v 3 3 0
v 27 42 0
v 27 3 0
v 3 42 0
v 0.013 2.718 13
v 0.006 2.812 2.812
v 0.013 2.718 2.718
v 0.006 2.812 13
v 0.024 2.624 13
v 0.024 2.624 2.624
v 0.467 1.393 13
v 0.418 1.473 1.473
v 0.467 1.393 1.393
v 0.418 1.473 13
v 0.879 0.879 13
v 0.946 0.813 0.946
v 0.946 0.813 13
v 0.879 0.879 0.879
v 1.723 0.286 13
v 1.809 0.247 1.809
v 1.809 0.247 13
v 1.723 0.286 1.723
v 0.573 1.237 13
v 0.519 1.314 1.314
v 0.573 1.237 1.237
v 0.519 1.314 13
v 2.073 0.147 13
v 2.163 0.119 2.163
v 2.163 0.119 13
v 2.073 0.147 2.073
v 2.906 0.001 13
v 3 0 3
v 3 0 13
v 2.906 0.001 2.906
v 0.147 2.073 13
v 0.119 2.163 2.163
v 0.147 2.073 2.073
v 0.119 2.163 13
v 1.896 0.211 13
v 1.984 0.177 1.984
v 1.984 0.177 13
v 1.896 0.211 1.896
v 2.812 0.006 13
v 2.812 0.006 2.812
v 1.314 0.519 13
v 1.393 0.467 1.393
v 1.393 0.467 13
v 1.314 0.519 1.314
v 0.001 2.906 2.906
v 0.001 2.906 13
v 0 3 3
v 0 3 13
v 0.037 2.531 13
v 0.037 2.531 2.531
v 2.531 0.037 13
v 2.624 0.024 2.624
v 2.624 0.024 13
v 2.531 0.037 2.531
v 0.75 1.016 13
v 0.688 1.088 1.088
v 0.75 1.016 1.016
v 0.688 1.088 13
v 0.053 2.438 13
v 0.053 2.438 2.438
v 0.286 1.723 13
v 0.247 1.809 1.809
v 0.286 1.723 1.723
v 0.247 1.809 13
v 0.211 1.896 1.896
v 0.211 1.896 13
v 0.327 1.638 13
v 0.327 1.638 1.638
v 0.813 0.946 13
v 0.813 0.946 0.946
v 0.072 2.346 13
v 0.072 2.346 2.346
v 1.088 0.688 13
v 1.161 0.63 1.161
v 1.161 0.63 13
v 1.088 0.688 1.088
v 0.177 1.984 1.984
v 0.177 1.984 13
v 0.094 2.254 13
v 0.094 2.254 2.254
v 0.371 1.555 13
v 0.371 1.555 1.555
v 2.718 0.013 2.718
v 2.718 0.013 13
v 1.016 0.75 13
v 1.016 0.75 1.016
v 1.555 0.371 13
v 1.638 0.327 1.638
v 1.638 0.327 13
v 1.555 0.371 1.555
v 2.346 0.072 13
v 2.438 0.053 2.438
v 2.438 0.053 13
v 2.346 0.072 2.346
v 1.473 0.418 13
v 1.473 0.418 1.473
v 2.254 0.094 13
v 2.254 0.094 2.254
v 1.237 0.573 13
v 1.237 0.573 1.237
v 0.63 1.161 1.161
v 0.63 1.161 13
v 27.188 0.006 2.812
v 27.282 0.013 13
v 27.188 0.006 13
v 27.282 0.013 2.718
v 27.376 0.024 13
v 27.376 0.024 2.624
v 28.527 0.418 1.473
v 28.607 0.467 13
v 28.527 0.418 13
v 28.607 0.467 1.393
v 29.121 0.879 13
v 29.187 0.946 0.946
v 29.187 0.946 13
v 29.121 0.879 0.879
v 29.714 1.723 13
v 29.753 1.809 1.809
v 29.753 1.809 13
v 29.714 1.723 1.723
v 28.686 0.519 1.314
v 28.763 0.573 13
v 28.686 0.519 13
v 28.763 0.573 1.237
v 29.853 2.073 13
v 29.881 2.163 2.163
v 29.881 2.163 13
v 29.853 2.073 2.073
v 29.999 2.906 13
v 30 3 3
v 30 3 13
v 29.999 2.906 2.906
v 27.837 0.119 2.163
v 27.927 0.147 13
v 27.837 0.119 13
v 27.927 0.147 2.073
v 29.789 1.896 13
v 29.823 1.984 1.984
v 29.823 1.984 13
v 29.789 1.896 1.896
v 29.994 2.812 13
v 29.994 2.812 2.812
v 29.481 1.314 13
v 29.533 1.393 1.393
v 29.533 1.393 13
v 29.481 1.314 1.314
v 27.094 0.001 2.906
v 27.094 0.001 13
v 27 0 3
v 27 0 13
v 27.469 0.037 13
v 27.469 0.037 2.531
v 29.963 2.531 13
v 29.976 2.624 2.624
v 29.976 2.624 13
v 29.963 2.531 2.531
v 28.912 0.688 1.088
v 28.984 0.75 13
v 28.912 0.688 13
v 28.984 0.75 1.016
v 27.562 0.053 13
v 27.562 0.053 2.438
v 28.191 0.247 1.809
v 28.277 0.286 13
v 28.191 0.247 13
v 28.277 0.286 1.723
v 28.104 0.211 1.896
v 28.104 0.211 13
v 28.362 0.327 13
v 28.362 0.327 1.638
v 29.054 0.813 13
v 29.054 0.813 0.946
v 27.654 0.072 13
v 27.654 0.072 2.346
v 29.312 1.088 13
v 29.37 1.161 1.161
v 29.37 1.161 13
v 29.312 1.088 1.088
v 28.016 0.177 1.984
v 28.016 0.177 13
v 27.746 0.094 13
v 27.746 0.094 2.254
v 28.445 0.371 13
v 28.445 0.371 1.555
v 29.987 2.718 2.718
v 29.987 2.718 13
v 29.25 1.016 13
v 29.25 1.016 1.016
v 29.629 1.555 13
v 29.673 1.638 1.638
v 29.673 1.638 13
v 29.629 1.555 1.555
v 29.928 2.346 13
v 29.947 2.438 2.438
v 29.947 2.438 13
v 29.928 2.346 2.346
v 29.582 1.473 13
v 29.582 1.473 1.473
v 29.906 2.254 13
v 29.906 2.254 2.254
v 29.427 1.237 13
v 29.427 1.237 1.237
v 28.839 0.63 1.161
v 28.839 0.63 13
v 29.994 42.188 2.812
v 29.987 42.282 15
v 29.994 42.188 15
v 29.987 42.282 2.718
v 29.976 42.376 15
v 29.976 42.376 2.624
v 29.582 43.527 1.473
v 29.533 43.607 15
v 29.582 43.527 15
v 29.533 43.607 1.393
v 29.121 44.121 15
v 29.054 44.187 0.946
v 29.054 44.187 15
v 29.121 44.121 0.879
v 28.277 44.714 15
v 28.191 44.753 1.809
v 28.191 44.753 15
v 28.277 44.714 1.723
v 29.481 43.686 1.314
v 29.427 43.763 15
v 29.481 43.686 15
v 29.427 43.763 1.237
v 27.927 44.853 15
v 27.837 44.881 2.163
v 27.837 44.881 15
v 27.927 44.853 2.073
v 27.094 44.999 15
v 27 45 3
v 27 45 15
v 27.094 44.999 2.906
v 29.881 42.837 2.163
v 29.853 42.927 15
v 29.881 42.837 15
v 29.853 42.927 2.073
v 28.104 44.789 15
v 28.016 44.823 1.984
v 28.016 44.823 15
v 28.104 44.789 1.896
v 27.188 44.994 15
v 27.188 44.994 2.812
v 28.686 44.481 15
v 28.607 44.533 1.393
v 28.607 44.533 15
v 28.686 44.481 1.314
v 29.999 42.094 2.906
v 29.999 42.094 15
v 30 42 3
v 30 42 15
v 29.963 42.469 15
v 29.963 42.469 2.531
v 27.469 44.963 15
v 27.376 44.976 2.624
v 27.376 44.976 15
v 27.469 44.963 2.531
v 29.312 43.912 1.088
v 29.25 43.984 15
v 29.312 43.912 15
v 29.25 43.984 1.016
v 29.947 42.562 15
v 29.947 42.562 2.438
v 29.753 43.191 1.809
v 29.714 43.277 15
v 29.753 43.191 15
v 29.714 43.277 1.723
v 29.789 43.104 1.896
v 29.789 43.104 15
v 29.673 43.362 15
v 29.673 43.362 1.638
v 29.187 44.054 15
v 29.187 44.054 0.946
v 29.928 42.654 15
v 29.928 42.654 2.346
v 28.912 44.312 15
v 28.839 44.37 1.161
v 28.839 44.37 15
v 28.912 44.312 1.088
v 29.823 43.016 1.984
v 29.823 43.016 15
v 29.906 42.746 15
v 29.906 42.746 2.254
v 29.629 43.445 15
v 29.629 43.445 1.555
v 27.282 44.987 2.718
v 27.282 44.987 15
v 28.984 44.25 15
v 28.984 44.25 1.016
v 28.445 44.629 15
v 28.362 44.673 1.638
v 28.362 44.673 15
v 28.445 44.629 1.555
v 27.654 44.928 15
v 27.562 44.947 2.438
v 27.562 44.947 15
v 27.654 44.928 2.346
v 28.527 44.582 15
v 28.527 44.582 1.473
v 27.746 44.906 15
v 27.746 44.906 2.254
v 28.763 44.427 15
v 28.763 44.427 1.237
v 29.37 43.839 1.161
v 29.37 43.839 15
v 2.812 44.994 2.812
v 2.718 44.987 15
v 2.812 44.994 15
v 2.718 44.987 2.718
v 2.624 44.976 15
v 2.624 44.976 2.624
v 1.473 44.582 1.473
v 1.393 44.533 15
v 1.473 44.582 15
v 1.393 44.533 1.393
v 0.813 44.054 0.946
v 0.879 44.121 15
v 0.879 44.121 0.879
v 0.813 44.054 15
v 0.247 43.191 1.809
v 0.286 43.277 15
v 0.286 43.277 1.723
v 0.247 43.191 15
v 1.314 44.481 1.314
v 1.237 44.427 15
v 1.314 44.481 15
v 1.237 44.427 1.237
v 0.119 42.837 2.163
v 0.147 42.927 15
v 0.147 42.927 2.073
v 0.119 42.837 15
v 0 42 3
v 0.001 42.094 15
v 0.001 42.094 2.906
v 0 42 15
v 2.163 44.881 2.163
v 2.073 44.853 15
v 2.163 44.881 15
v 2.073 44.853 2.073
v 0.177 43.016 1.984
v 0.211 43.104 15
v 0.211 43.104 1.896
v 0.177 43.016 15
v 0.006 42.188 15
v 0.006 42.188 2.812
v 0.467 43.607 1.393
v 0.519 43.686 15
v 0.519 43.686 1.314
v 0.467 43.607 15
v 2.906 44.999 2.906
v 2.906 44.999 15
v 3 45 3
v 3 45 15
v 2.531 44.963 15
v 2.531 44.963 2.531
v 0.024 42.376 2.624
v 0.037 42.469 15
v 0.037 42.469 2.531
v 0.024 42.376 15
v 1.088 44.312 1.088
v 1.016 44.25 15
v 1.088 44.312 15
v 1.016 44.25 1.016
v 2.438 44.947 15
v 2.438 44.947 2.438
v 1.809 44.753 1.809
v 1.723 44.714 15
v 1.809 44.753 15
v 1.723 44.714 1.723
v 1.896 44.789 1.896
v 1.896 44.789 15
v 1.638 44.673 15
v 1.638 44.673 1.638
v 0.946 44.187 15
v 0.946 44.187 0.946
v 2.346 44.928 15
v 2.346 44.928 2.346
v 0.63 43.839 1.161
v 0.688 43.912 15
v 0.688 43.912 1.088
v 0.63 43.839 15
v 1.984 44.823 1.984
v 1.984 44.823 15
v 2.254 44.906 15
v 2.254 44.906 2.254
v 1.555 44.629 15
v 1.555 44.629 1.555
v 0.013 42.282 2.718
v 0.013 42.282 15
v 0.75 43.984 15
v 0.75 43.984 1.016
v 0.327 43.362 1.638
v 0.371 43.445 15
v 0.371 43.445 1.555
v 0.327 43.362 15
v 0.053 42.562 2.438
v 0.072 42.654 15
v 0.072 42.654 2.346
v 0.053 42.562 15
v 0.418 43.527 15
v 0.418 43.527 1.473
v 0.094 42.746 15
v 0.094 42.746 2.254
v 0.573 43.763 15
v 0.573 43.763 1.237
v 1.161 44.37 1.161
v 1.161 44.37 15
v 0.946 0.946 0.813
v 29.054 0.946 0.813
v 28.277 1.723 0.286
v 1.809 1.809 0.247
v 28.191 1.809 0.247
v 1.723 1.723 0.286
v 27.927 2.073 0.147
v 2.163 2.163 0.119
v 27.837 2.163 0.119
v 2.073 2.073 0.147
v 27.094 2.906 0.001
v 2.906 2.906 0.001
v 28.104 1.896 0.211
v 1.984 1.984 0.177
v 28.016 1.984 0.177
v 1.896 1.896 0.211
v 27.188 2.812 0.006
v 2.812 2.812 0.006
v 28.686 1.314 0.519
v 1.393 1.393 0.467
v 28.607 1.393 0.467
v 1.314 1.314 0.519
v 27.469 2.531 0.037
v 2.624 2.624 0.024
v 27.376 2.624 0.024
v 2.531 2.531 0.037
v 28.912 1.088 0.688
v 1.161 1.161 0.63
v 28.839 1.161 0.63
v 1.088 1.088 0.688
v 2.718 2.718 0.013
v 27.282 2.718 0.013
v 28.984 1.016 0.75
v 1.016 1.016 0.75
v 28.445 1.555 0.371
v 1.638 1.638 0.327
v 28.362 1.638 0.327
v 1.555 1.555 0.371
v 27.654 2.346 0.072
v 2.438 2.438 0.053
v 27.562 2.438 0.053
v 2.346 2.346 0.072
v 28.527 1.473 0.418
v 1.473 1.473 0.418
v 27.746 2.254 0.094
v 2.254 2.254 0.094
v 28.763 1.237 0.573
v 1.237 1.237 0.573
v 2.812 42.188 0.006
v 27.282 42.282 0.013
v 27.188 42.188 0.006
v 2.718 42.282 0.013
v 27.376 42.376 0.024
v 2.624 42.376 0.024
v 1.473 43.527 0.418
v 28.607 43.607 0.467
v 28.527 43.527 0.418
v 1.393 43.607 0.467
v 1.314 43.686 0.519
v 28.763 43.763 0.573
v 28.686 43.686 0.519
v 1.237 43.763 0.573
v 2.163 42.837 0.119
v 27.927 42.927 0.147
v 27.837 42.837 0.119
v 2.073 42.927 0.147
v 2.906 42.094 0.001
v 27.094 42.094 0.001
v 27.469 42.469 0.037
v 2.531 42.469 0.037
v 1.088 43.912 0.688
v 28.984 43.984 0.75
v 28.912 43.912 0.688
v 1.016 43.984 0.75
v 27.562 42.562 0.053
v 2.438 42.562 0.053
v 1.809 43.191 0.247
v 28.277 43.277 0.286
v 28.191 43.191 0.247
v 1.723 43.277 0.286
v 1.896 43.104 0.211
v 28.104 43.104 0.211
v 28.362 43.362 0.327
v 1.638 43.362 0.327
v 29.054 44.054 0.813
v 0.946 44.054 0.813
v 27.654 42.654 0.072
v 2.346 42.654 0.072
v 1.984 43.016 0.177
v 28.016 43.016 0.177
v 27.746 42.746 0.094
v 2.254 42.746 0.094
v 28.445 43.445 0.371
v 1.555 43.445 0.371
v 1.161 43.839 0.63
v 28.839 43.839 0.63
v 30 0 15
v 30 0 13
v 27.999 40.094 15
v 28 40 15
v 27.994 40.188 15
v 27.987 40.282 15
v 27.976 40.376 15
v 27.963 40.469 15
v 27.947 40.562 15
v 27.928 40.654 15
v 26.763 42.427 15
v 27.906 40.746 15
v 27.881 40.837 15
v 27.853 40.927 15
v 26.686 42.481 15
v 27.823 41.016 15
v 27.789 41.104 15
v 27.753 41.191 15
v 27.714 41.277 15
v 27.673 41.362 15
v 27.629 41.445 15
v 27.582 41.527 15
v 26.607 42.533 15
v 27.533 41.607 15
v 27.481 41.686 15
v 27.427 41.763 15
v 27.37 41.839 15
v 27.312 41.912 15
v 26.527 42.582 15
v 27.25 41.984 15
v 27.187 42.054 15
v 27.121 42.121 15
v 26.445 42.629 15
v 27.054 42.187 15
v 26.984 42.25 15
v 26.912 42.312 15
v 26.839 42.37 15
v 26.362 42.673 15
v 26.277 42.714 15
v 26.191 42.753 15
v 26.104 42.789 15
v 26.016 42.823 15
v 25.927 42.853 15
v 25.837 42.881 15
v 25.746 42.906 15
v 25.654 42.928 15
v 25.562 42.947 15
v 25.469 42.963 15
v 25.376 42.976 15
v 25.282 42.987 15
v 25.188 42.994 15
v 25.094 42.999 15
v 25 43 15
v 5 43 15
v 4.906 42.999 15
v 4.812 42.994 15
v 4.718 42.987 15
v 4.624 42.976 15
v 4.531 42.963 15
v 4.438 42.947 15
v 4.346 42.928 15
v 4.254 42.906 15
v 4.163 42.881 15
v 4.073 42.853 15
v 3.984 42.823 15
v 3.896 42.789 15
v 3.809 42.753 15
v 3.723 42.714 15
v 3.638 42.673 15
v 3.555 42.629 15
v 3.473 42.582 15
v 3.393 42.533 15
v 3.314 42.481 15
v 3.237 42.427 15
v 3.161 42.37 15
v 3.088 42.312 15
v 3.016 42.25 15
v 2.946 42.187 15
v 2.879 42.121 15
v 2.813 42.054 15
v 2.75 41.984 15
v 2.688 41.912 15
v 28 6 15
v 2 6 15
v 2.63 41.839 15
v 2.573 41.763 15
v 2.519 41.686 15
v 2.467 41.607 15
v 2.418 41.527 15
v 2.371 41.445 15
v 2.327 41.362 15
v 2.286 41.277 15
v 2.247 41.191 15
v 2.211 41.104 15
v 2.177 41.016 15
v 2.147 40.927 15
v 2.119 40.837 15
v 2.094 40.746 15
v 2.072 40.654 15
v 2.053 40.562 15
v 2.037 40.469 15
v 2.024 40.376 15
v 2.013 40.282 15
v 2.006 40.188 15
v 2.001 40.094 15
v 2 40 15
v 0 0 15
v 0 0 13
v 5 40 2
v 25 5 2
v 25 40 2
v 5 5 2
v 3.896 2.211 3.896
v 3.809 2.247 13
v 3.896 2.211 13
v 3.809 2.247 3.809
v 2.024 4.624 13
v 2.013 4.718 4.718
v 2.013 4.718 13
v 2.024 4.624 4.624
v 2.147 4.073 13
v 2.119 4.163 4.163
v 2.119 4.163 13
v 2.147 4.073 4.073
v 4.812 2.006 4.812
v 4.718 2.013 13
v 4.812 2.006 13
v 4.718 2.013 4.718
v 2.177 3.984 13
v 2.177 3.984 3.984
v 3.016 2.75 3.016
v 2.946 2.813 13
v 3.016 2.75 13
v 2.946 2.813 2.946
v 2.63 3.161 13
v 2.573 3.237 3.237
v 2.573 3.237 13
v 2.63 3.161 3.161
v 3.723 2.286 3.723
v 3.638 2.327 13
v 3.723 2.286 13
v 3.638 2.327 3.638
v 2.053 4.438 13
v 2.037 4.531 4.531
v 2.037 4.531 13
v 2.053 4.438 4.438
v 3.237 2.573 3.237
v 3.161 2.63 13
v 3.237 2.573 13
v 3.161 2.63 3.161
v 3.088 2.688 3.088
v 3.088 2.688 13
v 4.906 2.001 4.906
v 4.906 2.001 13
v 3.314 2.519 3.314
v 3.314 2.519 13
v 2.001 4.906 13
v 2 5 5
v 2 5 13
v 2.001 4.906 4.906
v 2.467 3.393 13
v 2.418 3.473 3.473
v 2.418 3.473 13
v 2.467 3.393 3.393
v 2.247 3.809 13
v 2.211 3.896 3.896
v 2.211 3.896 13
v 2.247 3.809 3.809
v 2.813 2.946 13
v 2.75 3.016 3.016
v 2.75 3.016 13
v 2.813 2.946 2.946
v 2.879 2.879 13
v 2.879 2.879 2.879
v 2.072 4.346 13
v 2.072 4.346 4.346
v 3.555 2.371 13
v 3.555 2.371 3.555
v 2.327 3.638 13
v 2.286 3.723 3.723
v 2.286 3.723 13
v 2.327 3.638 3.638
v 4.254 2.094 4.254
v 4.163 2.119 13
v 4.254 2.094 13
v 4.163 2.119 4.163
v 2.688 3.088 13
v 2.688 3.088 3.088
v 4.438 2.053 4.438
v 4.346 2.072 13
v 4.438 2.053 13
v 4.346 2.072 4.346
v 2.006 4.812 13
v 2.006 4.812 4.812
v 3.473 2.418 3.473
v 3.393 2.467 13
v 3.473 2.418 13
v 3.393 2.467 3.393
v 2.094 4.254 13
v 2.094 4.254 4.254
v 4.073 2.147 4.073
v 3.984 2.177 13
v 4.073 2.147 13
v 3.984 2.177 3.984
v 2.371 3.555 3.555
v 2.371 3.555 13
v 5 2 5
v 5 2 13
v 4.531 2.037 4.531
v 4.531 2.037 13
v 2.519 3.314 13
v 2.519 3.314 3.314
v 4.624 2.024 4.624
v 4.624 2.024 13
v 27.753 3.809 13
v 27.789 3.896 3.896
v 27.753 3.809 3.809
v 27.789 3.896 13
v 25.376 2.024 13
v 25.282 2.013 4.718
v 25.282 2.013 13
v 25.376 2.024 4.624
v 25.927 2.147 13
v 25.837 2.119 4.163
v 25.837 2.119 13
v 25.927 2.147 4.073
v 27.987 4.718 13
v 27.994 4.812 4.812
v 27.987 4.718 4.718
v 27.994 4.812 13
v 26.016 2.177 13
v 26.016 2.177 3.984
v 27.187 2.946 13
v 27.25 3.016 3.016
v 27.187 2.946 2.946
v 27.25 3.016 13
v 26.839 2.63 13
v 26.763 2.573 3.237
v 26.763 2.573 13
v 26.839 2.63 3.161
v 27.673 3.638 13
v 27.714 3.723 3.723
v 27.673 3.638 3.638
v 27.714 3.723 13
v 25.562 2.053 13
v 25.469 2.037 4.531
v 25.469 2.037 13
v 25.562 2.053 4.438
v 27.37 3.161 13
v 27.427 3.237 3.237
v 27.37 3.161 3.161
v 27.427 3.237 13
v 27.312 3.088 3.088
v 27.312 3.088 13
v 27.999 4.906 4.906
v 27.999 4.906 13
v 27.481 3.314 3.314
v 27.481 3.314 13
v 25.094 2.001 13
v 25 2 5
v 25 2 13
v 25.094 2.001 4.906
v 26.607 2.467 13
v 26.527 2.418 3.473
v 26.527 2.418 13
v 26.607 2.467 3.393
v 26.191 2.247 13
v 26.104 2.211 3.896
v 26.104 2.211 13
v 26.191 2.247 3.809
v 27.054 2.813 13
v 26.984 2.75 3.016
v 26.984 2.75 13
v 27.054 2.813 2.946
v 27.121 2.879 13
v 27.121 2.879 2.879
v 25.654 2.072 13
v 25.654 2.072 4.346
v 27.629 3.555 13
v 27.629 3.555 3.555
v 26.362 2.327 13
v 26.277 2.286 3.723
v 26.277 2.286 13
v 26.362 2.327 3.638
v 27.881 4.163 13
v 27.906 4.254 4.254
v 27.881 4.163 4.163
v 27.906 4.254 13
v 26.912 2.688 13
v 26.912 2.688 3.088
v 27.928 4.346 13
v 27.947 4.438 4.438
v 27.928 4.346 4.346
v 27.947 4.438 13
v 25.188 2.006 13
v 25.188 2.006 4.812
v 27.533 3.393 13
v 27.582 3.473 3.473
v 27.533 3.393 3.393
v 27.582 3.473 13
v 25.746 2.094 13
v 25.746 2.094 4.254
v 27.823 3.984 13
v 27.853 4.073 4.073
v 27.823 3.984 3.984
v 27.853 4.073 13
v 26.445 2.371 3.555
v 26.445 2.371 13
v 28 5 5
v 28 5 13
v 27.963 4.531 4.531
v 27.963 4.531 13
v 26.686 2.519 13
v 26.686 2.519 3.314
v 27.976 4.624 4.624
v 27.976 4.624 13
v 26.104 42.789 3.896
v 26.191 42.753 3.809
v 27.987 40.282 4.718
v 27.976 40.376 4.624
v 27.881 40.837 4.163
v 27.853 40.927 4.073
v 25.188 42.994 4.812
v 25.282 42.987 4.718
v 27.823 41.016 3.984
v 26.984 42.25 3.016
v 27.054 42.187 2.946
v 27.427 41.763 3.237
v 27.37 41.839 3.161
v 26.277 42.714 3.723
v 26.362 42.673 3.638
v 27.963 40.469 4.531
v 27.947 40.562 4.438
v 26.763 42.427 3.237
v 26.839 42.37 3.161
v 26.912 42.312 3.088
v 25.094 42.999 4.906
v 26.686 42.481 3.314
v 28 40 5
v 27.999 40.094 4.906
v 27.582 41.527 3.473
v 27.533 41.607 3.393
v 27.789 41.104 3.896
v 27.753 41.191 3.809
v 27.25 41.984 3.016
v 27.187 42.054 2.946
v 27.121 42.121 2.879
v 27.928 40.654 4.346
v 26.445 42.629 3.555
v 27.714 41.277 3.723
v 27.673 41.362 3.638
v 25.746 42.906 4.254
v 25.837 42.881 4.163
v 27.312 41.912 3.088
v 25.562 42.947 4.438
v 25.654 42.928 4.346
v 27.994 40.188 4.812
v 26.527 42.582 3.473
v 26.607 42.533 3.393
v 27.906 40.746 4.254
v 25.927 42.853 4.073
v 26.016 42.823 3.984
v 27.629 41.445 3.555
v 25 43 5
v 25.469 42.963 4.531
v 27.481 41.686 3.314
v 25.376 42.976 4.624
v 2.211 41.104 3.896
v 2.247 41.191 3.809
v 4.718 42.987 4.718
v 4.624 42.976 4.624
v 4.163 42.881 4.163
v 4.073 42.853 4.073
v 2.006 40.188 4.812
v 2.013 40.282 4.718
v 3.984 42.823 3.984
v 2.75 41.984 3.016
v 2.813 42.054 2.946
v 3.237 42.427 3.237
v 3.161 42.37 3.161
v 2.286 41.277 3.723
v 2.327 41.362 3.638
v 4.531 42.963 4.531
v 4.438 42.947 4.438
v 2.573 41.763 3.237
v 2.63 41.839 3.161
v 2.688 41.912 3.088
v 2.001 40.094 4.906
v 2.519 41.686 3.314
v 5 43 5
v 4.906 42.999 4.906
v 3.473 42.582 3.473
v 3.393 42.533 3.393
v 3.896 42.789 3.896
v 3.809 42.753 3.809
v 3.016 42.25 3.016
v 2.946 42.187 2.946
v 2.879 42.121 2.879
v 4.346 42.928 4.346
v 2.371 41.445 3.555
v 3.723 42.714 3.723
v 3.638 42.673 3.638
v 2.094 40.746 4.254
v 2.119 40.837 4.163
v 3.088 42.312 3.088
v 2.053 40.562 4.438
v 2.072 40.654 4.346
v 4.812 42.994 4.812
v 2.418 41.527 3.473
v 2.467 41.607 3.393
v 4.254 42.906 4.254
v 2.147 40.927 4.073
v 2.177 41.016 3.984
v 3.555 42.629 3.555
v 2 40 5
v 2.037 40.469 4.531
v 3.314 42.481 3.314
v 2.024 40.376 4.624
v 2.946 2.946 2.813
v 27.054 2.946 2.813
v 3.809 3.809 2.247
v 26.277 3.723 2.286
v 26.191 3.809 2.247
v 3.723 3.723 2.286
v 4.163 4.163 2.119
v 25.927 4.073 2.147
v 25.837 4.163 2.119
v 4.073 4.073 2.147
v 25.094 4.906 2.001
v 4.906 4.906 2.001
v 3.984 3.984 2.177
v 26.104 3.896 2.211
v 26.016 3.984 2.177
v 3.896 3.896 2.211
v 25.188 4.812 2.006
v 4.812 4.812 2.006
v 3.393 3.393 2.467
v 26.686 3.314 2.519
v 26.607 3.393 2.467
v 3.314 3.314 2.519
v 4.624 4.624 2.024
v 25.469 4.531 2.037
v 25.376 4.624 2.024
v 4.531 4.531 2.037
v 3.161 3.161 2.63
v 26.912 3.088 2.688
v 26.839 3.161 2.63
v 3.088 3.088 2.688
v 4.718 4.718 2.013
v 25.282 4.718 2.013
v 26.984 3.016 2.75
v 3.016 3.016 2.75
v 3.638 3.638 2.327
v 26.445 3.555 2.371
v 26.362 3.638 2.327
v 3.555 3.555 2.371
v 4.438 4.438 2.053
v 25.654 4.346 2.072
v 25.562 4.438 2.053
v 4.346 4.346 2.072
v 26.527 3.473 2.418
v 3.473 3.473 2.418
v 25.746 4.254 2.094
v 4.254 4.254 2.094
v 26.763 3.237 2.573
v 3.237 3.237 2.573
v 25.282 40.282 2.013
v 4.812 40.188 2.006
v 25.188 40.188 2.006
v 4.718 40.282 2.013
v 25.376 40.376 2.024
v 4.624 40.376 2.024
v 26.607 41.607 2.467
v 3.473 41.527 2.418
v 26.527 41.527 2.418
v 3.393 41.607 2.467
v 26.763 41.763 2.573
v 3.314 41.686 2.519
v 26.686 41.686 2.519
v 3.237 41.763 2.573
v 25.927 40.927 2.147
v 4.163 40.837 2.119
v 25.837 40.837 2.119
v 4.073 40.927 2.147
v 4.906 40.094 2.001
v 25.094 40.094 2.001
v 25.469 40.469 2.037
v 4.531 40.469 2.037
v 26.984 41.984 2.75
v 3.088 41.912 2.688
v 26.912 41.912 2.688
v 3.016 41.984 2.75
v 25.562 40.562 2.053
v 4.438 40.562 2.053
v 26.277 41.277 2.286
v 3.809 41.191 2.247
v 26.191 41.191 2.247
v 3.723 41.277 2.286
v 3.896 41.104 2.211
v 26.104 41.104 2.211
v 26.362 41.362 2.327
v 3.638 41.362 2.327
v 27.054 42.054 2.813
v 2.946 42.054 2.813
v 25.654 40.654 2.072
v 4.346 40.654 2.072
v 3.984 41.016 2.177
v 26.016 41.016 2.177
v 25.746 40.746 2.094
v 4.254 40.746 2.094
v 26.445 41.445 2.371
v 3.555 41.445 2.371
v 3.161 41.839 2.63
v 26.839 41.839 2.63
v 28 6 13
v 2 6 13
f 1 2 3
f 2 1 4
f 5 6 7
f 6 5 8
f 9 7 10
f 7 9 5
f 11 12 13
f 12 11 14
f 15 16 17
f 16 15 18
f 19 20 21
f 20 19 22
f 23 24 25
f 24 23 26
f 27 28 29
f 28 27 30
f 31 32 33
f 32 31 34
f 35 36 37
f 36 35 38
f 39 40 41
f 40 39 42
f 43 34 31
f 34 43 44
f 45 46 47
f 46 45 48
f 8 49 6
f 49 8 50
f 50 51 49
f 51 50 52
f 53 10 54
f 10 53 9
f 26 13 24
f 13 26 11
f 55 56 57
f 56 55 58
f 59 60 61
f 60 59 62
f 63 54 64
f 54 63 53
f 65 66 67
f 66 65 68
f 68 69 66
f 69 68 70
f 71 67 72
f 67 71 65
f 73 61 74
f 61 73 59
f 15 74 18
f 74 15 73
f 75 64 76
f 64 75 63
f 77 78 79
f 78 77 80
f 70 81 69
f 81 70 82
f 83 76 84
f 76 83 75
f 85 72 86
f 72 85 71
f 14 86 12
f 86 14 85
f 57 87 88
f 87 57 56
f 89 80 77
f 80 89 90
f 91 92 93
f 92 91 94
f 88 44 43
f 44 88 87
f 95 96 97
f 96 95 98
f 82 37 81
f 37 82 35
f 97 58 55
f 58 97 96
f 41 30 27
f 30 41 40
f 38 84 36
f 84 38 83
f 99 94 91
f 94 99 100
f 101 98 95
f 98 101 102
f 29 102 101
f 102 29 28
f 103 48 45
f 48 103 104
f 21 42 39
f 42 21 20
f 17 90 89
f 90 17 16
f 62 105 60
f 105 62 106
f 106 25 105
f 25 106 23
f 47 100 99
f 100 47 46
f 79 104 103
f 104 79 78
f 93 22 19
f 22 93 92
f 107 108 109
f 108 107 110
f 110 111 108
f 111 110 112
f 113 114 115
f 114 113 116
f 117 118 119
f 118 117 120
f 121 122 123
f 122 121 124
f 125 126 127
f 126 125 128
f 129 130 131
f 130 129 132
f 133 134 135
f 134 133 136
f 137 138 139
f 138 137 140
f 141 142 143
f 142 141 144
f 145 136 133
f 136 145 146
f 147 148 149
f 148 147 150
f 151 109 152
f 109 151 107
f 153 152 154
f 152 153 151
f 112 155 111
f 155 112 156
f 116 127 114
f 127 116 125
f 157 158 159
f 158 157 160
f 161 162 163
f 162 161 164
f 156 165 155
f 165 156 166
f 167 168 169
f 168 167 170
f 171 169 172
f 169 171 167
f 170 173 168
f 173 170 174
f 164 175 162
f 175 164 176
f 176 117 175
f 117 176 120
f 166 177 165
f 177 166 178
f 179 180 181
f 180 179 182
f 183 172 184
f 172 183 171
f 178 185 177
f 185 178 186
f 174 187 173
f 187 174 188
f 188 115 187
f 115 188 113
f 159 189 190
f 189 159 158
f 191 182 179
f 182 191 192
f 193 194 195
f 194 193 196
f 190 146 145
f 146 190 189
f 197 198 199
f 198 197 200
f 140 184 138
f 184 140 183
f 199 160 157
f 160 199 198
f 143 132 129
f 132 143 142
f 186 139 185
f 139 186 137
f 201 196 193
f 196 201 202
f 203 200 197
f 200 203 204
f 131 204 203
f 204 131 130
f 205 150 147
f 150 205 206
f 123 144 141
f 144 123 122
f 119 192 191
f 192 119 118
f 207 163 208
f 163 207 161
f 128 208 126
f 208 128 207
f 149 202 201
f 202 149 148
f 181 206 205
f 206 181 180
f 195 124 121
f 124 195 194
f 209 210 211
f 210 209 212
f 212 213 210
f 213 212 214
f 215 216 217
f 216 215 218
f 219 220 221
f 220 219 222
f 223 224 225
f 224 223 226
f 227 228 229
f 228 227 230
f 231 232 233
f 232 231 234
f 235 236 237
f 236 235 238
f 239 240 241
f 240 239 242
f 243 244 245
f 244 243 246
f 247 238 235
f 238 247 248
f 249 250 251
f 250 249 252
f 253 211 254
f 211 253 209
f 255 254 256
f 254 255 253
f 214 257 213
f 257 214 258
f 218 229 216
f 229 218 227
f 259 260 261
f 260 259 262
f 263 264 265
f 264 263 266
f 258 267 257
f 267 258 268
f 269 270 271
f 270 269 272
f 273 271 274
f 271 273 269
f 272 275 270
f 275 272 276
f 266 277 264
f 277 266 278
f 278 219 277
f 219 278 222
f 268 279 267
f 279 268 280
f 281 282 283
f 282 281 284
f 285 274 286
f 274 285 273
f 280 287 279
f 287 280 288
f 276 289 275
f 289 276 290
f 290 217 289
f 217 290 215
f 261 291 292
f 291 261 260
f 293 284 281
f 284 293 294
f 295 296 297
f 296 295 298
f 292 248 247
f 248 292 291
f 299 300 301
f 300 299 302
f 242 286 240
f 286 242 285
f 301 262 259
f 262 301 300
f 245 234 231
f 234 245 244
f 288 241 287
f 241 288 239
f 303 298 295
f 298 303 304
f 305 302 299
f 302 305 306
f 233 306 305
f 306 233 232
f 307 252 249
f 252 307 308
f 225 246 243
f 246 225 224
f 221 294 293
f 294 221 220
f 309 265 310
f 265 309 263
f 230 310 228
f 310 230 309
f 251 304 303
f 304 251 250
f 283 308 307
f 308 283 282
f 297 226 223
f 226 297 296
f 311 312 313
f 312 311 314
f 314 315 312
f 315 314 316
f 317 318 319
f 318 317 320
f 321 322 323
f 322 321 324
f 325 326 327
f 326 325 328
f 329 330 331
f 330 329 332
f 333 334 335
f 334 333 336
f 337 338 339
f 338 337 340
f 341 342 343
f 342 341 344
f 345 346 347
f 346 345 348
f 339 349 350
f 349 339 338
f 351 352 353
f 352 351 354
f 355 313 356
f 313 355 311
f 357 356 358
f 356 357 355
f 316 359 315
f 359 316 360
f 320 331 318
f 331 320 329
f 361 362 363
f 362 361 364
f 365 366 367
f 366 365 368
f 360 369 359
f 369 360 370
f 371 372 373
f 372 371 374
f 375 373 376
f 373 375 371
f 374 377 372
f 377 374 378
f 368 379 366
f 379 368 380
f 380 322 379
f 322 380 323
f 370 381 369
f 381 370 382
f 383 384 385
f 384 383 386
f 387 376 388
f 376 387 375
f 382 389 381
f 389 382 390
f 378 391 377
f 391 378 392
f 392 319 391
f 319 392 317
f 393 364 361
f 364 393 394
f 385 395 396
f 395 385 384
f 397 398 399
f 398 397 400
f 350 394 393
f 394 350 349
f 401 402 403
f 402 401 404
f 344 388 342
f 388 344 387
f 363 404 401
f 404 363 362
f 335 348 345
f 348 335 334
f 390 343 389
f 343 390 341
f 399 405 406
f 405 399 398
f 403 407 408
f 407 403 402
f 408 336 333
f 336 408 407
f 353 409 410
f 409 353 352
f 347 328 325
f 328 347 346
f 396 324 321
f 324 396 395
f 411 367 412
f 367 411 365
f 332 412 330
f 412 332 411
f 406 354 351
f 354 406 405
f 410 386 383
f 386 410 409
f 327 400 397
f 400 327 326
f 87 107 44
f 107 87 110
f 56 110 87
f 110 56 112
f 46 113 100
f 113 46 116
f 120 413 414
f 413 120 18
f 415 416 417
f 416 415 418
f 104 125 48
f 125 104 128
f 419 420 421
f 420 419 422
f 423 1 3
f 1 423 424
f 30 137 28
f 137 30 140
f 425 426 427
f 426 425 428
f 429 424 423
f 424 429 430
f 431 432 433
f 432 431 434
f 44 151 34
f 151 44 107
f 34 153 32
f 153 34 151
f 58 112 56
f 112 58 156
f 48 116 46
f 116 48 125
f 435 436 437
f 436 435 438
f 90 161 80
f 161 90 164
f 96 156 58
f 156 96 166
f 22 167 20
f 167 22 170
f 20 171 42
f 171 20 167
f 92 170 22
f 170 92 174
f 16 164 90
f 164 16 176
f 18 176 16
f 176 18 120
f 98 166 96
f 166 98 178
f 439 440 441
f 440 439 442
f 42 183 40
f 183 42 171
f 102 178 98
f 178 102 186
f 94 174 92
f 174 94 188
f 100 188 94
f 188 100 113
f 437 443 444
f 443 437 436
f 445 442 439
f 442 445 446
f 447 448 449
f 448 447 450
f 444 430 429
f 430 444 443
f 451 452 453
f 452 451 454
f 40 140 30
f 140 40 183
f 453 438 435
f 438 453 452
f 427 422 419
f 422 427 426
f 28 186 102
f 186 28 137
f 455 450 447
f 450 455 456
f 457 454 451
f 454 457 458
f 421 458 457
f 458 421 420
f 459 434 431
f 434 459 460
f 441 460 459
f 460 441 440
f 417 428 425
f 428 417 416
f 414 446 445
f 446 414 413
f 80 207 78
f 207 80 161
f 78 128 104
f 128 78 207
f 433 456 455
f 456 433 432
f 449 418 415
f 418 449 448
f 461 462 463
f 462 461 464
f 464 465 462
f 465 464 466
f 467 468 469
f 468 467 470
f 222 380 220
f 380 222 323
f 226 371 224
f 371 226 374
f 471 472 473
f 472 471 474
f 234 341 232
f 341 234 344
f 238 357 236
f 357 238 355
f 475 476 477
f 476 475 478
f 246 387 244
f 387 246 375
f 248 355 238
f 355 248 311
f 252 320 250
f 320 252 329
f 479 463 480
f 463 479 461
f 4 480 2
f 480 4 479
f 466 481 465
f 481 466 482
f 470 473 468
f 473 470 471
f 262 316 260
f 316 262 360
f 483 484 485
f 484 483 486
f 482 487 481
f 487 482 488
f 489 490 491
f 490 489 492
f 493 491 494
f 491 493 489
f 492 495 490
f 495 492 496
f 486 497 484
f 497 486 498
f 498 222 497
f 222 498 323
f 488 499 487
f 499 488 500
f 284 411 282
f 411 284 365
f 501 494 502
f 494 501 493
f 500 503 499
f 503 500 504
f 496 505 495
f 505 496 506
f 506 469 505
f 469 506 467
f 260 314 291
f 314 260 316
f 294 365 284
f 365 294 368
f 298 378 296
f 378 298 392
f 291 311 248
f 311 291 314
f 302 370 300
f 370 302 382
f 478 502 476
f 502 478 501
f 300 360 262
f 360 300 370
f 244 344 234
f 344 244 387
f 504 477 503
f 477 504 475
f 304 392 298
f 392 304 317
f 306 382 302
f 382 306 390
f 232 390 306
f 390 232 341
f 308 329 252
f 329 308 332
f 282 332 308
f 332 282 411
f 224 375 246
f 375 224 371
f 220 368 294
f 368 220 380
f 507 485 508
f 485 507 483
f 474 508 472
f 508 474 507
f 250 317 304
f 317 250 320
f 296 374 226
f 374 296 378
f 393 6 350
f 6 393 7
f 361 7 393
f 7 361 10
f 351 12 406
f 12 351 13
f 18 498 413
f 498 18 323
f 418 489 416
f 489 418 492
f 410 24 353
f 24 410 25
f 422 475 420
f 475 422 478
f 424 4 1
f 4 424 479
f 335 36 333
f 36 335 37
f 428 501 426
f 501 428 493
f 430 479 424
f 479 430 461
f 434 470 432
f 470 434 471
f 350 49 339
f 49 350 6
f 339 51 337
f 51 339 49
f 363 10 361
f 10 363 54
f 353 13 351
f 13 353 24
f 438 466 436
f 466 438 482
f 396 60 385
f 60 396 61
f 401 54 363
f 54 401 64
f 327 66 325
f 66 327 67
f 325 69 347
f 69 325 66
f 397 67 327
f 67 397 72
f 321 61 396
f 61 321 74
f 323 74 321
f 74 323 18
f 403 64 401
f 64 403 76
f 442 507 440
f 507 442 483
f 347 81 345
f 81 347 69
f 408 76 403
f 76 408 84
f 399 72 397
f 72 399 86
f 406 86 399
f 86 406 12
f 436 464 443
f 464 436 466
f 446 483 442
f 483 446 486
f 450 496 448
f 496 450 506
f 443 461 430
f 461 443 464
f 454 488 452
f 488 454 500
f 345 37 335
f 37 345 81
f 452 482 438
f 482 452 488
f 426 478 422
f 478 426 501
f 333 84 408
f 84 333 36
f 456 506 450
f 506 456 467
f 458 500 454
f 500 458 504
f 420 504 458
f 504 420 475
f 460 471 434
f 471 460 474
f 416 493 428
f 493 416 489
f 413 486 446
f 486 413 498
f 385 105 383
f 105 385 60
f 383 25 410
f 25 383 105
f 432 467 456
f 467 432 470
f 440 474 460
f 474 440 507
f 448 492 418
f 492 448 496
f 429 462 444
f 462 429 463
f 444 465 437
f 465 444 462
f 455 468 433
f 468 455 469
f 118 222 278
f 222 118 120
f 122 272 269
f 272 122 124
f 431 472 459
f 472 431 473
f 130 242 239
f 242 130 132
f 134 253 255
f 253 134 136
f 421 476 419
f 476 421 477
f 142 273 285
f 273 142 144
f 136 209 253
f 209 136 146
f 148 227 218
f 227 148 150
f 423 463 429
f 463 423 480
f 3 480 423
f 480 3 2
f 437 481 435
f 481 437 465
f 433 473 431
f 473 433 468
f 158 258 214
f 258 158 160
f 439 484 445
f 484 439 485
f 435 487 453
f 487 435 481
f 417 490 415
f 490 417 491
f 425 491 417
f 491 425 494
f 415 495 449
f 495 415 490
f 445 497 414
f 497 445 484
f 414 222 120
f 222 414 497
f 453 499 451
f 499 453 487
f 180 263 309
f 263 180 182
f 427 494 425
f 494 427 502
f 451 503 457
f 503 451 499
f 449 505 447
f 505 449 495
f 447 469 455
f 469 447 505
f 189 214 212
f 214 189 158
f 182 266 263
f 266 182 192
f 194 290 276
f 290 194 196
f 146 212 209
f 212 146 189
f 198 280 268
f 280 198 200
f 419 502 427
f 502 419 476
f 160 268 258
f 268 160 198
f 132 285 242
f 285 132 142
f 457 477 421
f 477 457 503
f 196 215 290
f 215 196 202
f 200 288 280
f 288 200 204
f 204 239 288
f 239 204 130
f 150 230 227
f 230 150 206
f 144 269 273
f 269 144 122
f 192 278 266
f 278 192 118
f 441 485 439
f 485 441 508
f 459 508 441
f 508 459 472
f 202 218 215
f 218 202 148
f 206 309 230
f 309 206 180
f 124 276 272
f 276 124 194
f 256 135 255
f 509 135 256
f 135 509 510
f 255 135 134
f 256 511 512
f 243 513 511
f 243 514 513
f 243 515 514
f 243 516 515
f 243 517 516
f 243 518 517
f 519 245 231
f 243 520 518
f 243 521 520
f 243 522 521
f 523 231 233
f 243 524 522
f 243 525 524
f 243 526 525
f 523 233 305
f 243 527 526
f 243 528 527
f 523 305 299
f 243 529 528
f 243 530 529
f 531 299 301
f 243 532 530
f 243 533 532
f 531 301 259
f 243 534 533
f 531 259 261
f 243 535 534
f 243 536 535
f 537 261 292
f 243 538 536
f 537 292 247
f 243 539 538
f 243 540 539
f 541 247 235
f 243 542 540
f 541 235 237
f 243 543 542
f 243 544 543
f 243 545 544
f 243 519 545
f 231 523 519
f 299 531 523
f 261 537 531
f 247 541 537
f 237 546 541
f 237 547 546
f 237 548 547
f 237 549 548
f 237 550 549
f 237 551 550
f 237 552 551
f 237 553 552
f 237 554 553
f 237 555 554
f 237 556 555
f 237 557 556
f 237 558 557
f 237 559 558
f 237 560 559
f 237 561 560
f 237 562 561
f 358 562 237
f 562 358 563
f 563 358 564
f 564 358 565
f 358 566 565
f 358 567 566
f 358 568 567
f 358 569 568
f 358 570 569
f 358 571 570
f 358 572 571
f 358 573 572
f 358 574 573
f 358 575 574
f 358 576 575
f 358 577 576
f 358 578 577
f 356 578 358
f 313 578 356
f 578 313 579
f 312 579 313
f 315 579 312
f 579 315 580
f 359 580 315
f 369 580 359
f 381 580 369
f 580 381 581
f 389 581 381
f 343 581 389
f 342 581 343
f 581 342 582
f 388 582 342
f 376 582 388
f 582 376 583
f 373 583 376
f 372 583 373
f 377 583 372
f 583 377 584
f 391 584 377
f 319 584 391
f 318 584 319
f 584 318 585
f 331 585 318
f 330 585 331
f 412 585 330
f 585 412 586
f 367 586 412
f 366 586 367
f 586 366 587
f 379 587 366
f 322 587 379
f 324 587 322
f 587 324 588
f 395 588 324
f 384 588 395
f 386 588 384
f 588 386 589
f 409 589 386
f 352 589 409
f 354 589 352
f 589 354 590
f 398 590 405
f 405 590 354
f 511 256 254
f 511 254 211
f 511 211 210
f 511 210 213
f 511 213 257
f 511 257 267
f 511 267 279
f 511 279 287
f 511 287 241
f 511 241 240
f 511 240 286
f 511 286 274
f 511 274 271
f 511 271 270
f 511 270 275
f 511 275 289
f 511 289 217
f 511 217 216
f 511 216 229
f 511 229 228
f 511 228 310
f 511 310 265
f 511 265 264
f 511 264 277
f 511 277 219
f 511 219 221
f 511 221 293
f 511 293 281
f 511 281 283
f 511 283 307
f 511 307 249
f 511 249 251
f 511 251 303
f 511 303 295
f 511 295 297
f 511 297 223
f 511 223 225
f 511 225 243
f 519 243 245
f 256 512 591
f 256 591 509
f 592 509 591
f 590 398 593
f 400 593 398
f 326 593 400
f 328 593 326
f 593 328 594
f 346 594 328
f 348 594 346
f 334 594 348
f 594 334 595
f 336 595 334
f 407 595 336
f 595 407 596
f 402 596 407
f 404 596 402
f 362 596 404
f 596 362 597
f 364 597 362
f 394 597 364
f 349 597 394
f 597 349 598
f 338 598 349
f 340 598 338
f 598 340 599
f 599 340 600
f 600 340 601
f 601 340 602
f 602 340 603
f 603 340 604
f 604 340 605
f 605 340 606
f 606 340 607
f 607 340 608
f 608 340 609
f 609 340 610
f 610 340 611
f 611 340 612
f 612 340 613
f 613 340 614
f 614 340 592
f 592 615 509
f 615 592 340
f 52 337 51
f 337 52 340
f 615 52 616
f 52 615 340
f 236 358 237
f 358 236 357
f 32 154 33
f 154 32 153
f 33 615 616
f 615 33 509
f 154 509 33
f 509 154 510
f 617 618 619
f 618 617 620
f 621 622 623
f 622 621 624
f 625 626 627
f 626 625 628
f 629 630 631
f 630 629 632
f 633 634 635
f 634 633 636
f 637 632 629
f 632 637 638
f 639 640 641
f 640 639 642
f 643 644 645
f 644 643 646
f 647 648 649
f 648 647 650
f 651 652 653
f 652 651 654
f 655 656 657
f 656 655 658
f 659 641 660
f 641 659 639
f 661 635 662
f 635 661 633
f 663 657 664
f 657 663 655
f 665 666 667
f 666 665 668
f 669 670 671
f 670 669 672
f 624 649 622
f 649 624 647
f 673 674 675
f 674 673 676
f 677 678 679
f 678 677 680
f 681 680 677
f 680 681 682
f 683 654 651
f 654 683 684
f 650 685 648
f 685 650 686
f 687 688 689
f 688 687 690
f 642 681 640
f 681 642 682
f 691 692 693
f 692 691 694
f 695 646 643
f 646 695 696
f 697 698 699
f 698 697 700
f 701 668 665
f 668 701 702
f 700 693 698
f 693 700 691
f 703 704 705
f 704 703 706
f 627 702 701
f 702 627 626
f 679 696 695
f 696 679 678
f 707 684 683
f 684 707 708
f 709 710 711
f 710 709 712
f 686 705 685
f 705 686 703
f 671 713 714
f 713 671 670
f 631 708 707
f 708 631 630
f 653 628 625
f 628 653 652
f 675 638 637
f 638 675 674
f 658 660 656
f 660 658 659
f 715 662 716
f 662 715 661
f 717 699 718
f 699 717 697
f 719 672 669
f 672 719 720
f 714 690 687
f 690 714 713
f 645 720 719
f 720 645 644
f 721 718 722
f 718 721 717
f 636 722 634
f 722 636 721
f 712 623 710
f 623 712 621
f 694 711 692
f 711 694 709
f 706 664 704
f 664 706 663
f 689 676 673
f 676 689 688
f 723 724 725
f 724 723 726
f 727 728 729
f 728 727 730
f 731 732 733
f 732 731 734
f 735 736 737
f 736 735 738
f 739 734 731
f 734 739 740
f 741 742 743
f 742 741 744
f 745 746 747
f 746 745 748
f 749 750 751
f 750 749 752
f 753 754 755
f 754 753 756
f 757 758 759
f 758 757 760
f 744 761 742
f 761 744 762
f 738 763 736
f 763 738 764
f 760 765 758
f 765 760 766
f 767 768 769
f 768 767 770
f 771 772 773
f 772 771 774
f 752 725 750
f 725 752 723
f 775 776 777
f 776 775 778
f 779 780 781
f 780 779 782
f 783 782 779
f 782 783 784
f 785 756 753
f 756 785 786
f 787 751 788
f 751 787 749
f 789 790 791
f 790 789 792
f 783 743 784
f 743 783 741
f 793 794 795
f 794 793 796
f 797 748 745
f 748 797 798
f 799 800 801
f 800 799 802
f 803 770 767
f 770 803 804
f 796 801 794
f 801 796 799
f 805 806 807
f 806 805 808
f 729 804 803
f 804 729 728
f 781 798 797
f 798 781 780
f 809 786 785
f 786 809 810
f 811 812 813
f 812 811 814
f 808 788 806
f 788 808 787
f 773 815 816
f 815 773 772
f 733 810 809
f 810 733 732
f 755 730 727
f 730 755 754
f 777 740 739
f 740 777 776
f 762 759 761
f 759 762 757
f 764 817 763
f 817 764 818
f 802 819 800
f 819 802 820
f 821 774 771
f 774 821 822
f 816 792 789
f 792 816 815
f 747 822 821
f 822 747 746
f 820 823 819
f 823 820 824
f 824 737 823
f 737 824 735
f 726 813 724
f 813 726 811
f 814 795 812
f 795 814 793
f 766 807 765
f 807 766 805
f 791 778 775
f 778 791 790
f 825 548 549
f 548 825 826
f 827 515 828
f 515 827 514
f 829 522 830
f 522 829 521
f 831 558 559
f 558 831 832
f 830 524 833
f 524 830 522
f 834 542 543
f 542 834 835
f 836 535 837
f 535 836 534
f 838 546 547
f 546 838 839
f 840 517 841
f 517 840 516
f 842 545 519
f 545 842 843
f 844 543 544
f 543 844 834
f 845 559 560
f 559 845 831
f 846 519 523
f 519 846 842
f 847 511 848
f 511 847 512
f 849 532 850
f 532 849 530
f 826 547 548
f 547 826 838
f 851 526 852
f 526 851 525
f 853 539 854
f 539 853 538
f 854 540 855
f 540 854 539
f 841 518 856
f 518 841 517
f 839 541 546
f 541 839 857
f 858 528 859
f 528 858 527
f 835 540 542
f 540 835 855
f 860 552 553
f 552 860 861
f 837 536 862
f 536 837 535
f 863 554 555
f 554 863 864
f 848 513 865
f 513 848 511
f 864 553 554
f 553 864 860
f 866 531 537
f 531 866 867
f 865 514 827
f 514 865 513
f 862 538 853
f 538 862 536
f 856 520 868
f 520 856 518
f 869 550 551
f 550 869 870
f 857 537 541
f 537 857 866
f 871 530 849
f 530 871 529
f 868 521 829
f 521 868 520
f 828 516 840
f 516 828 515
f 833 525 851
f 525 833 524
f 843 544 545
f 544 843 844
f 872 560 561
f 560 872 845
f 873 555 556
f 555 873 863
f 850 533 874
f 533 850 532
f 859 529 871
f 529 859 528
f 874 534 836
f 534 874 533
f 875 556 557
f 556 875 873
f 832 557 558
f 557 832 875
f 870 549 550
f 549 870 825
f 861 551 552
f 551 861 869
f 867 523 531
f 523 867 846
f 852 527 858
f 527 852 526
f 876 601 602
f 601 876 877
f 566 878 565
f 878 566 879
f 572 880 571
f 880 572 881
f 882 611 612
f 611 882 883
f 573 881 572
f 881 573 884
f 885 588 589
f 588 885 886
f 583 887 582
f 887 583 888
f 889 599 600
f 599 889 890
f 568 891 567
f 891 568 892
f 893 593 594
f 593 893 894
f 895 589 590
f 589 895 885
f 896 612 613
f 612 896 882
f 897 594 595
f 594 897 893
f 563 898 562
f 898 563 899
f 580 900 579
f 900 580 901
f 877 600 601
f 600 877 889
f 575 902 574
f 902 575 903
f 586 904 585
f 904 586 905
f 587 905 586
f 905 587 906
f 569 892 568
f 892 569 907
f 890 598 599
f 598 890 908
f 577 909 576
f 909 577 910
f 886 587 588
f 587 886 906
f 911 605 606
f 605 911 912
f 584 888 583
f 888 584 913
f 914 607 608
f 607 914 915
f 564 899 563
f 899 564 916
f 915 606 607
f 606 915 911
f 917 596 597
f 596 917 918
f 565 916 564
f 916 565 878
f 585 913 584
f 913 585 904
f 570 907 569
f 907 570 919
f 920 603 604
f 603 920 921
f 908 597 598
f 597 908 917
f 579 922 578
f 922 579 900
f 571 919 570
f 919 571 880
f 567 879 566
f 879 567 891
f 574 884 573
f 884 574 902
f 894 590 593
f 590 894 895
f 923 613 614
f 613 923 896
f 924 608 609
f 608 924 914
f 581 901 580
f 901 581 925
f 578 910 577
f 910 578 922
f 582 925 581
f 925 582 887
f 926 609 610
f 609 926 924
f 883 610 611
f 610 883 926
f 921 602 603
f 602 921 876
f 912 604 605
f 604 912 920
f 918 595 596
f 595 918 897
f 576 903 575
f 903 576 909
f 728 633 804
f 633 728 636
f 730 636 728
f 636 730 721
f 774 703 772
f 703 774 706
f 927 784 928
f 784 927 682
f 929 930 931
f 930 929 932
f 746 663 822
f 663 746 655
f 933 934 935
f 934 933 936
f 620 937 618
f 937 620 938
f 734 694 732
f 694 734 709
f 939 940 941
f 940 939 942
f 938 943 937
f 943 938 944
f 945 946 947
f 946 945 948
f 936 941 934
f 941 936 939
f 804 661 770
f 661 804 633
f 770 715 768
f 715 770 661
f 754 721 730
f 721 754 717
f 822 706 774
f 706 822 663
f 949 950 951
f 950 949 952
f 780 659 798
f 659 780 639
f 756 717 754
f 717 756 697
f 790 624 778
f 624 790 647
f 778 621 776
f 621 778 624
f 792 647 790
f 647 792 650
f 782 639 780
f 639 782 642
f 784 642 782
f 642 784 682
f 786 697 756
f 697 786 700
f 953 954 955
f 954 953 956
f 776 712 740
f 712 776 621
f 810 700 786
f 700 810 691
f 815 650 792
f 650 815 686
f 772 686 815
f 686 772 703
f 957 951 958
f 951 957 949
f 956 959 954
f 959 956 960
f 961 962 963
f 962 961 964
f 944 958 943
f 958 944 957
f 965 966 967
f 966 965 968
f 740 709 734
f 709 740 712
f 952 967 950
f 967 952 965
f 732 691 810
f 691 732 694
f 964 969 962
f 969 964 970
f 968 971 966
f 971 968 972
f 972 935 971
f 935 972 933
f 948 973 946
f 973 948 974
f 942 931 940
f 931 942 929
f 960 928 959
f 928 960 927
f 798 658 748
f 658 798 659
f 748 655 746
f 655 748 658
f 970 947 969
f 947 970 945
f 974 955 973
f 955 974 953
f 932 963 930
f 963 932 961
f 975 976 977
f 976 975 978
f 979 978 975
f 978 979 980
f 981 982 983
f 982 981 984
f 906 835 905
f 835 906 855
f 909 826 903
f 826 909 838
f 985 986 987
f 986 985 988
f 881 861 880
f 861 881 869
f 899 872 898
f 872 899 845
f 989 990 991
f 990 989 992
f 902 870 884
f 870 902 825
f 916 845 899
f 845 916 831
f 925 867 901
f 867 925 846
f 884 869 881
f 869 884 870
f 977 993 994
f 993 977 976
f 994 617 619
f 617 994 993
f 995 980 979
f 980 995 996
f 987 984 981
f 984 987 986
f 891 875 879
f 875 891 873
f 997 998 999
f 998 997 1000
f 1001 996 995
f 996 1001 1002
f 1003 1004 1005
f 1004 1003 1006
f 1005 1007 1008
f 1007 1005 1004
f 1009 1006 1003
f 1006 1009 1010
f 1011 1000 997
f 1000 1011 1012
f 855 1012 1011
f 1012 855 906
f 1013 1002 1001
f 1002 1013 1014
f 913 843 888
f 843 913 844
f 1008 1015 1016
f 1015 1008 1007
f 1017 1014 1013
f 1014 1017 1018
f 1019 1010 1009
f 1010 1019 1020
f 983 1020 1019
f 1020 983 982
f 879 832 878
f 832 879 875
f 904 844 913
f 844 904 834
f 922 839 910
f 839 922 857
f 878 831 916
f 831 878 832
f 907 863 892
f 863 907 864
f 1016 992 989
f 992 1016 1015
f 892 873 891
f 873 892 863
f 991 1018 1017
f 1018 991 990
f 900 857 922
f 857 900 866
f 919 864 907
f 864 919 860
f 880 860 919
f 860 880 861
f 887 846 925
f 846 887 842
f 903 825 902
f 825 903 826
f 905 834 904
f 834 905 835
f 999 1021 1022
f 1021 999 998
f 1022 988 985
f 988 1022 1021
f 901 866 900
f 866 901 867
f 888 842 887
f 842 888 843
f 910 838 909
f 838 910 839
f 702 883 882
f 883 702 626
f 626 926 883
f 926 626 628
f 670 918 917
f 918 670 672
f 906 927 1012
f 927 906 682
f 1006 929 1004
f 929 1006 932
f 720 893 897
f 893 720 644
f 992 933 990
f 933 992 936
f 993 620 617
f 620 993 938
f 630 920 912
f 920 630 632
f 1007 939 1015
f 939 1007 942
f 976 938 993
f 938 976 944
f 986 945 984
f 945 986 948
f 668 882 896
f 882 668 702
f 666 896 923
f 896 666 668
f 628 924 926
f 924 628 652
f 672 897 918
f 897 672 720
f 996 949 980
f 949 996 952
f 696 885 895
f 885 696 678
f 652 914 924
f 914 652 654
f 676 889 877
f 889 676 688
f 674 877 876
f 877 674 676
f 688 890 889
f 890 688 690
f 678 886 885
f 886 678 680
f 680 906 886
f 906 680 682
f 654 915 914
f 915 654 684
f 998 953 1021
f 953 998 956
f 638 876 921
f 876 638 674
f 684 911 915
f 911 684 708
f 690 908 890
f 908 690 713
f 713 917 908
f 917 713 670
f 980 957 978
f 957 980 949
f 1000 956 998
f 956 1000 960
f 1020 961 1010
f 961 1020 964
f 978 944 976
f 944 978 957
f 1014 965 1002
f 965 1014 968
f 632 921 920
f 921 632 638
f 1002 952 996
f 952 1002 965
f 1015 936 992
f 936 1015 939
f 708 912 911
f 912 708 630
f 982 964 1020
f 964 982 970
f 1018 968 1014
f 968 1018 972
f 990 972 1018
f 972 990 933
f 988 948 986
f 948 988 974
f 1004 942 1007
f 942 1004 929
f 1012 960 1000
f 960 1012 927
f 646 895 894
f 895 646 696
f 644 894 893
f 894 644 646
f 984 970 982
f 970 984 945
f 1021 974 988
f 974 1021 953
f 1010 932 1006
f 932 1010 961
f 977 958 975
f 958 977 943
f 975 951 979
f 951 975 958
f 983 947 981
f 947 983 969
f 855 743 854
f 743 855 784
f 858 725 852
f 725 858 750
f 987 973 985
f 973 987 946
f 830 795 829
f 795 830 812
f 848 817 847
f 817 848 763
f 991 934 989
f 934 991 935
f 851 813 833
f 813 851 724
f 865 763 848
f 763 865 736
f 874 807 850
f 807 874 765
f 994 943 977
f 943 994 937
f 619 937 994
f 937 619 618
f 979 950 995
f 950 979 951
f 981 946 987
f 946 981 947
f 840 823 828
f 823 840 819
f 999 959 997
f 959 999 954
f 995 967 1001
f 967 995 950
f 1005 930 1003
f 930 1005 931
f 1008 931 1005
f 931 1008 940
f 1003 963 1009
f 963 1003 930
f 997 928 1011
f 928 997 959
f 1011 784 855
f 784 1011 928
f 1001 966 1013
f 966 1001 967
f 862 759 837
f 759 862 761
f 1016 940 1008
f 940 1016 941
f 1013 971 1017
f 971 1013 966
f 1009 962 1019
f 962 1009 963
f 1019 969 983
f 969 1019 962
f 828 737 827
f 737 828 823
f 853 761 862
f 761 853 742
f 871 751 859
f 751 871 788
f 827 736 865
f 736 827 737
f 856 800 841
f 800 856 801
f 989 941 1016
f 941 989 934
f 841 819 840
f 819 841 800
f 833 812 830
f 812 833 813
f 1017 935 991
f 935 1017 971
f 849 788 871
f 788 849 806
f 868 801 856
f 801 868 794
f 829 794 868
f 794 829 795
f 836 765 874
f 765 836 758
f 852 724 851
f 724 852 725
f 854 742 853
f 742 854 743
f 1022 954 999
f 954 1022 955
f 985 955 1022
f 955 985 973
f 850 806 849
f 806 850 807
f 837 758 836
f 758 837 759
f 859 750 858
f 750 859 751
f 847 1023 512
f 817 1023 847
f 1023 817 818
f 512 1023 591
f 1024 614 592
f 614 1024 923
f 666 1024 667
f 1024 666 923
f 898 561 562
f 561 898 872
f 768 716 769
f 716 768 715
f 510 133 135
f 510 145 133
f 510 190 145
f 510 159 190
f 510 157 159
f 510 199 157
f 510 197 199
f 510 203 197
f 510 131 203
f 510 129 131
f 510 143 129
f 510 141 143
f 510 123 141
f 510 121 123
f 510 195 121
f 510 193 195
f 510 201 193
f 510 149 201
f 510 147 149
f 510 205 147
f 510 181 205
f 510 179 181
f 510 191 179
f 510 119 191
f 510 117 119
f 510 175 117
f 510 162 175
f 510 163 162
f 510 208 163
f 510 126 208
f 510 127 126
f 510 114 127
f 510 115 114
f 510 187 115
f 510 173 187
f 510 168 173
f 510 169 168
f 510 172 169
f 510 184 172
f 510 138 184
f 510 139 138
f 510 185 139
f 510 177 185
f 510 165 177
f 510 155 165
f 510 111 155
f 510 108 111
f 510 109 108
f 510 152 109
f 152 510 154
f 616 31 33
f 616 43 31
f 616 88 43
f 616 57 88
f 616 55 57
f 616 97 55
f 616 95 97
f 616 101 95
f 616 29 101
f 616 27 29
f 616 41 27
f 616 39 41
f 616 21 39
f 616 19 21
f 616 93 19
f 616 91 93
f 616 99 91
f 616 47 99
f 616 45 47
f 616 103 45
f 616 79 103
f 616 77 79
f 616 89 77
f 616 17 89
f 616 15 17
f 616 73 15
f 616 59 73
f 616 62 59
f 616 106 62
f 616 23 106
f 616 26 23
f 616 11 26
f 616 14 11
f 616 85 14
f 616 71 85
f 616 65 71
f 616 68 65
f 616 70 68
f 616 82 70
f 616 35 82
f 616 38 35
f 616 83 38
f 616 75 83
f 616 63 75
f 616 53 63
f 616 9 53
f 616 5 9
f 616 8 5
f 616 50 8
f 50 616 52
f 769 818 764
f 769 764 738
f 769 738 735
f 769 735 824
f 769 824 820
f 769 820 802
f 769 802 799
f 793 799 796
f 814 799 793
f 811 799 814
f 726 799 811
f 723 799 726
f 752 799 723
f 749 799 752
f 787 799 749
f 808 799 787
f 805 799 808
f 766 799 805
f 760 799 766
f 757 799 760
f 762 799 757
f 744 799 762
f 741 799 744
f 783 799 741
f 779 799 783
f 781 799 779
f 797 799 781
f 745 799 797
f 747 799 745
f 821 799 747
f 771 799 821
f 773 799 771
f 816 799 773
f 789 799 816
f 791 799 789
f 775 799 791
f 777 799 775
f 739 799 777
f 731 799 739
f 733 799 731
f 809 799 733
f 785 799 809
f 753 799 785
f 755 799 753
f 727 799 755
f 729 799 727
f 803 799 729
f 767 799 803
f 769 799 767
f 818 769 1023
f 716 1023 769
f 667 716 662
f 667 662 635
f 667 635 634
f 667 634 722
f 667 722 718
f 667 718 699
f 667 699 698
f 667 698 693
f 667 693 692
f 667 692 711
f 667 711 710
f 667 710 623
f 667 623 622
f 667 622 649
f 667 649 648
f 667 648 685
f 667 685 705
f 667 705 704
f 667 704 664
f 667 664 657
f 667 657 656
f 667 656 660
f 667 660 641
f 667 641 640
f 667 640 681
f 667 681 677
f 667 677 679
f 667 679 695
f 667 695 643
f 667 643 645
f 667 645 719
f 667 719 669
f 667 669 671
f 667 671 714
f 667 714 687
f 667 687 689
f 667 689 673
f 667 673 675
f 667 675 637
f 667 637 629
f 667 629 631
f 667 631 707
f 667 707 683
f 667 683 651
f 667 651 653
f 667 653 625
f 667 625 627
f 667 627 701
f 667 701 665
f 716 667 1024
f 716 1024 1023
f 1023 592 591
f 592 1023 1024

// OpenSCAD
$fn=200;

length = 45;
width = 30;
height = 15;
cornerRadius = 3;
thickness = 2;
lipDepth = 6;
dividerHeight = 0; //height - thickness;

translate([0, 0, 0]) {
    box(length, width, height, cornerRadius, thickness, lipDepth, dividerHeight);
}

module box(length, width, height, radius, thickness, lipDepth, dividerHeight) {
    thickness2 = 2*thickness;
    union(){
        difference() {
            boxpart(length, width, height, radius);
            translate([thickness, thickness, thickness]) 
              boxpart(length-thickness2, width-thickness2, height-thickness+0.01, radius);
        }
        if (lipDepth > 0) {
            translate([0, 0, height-thickness]) cube([width, lipDepth, thickness]);
        }
        if (dividerHeight > 0) {
            translate([0, length/2, thickness]) cube([width-thickness, thickness, dividerHeight]);
        }
    }
}

module boxpart(length, width, height, radius) {
    difference() {
        cube(size=[width, length, height]);
        // The intersection of these will give corners which are imperfect,
        // but good enough.
        rounderZ(length, width, height+0.2, radius);
        rounderXL(length, width, height, radius);
        rounderYL(length, width, height, radius);
    }
}

module rounderZ(length, width, height, radius) {
    rounder2(height, radius, width);
    translate([width, length, 0]) rotate([0, 0, 180]) rounder2(height, radius, width);
}

module rounderXL(length, width, height, radius) {
    rotate([90, 0, 90]) rounder2(width, radius, length);
}

module rounderYL(length, width, height, radius) {
    translate([0, length, 0]) rotate([90, 0, 0]) rounder2(length, radius, width);
}

module rounder2(height, radius, spacing) {
    rounder(height, radius);
    translate([spacing, 0, 0]) rotate([0, 0, 90]) rounder(height, radius);
}

module rounder(height, radius) {
    slop = 0.2;
    difference() {
        translate([-radius, -radius, 0]) cube(size=[radius*2, radius*2, height]);
        translate([radius, radius, -slop/2]) cylinder(h=height+slop, r=radius, center=false);
    }
}
